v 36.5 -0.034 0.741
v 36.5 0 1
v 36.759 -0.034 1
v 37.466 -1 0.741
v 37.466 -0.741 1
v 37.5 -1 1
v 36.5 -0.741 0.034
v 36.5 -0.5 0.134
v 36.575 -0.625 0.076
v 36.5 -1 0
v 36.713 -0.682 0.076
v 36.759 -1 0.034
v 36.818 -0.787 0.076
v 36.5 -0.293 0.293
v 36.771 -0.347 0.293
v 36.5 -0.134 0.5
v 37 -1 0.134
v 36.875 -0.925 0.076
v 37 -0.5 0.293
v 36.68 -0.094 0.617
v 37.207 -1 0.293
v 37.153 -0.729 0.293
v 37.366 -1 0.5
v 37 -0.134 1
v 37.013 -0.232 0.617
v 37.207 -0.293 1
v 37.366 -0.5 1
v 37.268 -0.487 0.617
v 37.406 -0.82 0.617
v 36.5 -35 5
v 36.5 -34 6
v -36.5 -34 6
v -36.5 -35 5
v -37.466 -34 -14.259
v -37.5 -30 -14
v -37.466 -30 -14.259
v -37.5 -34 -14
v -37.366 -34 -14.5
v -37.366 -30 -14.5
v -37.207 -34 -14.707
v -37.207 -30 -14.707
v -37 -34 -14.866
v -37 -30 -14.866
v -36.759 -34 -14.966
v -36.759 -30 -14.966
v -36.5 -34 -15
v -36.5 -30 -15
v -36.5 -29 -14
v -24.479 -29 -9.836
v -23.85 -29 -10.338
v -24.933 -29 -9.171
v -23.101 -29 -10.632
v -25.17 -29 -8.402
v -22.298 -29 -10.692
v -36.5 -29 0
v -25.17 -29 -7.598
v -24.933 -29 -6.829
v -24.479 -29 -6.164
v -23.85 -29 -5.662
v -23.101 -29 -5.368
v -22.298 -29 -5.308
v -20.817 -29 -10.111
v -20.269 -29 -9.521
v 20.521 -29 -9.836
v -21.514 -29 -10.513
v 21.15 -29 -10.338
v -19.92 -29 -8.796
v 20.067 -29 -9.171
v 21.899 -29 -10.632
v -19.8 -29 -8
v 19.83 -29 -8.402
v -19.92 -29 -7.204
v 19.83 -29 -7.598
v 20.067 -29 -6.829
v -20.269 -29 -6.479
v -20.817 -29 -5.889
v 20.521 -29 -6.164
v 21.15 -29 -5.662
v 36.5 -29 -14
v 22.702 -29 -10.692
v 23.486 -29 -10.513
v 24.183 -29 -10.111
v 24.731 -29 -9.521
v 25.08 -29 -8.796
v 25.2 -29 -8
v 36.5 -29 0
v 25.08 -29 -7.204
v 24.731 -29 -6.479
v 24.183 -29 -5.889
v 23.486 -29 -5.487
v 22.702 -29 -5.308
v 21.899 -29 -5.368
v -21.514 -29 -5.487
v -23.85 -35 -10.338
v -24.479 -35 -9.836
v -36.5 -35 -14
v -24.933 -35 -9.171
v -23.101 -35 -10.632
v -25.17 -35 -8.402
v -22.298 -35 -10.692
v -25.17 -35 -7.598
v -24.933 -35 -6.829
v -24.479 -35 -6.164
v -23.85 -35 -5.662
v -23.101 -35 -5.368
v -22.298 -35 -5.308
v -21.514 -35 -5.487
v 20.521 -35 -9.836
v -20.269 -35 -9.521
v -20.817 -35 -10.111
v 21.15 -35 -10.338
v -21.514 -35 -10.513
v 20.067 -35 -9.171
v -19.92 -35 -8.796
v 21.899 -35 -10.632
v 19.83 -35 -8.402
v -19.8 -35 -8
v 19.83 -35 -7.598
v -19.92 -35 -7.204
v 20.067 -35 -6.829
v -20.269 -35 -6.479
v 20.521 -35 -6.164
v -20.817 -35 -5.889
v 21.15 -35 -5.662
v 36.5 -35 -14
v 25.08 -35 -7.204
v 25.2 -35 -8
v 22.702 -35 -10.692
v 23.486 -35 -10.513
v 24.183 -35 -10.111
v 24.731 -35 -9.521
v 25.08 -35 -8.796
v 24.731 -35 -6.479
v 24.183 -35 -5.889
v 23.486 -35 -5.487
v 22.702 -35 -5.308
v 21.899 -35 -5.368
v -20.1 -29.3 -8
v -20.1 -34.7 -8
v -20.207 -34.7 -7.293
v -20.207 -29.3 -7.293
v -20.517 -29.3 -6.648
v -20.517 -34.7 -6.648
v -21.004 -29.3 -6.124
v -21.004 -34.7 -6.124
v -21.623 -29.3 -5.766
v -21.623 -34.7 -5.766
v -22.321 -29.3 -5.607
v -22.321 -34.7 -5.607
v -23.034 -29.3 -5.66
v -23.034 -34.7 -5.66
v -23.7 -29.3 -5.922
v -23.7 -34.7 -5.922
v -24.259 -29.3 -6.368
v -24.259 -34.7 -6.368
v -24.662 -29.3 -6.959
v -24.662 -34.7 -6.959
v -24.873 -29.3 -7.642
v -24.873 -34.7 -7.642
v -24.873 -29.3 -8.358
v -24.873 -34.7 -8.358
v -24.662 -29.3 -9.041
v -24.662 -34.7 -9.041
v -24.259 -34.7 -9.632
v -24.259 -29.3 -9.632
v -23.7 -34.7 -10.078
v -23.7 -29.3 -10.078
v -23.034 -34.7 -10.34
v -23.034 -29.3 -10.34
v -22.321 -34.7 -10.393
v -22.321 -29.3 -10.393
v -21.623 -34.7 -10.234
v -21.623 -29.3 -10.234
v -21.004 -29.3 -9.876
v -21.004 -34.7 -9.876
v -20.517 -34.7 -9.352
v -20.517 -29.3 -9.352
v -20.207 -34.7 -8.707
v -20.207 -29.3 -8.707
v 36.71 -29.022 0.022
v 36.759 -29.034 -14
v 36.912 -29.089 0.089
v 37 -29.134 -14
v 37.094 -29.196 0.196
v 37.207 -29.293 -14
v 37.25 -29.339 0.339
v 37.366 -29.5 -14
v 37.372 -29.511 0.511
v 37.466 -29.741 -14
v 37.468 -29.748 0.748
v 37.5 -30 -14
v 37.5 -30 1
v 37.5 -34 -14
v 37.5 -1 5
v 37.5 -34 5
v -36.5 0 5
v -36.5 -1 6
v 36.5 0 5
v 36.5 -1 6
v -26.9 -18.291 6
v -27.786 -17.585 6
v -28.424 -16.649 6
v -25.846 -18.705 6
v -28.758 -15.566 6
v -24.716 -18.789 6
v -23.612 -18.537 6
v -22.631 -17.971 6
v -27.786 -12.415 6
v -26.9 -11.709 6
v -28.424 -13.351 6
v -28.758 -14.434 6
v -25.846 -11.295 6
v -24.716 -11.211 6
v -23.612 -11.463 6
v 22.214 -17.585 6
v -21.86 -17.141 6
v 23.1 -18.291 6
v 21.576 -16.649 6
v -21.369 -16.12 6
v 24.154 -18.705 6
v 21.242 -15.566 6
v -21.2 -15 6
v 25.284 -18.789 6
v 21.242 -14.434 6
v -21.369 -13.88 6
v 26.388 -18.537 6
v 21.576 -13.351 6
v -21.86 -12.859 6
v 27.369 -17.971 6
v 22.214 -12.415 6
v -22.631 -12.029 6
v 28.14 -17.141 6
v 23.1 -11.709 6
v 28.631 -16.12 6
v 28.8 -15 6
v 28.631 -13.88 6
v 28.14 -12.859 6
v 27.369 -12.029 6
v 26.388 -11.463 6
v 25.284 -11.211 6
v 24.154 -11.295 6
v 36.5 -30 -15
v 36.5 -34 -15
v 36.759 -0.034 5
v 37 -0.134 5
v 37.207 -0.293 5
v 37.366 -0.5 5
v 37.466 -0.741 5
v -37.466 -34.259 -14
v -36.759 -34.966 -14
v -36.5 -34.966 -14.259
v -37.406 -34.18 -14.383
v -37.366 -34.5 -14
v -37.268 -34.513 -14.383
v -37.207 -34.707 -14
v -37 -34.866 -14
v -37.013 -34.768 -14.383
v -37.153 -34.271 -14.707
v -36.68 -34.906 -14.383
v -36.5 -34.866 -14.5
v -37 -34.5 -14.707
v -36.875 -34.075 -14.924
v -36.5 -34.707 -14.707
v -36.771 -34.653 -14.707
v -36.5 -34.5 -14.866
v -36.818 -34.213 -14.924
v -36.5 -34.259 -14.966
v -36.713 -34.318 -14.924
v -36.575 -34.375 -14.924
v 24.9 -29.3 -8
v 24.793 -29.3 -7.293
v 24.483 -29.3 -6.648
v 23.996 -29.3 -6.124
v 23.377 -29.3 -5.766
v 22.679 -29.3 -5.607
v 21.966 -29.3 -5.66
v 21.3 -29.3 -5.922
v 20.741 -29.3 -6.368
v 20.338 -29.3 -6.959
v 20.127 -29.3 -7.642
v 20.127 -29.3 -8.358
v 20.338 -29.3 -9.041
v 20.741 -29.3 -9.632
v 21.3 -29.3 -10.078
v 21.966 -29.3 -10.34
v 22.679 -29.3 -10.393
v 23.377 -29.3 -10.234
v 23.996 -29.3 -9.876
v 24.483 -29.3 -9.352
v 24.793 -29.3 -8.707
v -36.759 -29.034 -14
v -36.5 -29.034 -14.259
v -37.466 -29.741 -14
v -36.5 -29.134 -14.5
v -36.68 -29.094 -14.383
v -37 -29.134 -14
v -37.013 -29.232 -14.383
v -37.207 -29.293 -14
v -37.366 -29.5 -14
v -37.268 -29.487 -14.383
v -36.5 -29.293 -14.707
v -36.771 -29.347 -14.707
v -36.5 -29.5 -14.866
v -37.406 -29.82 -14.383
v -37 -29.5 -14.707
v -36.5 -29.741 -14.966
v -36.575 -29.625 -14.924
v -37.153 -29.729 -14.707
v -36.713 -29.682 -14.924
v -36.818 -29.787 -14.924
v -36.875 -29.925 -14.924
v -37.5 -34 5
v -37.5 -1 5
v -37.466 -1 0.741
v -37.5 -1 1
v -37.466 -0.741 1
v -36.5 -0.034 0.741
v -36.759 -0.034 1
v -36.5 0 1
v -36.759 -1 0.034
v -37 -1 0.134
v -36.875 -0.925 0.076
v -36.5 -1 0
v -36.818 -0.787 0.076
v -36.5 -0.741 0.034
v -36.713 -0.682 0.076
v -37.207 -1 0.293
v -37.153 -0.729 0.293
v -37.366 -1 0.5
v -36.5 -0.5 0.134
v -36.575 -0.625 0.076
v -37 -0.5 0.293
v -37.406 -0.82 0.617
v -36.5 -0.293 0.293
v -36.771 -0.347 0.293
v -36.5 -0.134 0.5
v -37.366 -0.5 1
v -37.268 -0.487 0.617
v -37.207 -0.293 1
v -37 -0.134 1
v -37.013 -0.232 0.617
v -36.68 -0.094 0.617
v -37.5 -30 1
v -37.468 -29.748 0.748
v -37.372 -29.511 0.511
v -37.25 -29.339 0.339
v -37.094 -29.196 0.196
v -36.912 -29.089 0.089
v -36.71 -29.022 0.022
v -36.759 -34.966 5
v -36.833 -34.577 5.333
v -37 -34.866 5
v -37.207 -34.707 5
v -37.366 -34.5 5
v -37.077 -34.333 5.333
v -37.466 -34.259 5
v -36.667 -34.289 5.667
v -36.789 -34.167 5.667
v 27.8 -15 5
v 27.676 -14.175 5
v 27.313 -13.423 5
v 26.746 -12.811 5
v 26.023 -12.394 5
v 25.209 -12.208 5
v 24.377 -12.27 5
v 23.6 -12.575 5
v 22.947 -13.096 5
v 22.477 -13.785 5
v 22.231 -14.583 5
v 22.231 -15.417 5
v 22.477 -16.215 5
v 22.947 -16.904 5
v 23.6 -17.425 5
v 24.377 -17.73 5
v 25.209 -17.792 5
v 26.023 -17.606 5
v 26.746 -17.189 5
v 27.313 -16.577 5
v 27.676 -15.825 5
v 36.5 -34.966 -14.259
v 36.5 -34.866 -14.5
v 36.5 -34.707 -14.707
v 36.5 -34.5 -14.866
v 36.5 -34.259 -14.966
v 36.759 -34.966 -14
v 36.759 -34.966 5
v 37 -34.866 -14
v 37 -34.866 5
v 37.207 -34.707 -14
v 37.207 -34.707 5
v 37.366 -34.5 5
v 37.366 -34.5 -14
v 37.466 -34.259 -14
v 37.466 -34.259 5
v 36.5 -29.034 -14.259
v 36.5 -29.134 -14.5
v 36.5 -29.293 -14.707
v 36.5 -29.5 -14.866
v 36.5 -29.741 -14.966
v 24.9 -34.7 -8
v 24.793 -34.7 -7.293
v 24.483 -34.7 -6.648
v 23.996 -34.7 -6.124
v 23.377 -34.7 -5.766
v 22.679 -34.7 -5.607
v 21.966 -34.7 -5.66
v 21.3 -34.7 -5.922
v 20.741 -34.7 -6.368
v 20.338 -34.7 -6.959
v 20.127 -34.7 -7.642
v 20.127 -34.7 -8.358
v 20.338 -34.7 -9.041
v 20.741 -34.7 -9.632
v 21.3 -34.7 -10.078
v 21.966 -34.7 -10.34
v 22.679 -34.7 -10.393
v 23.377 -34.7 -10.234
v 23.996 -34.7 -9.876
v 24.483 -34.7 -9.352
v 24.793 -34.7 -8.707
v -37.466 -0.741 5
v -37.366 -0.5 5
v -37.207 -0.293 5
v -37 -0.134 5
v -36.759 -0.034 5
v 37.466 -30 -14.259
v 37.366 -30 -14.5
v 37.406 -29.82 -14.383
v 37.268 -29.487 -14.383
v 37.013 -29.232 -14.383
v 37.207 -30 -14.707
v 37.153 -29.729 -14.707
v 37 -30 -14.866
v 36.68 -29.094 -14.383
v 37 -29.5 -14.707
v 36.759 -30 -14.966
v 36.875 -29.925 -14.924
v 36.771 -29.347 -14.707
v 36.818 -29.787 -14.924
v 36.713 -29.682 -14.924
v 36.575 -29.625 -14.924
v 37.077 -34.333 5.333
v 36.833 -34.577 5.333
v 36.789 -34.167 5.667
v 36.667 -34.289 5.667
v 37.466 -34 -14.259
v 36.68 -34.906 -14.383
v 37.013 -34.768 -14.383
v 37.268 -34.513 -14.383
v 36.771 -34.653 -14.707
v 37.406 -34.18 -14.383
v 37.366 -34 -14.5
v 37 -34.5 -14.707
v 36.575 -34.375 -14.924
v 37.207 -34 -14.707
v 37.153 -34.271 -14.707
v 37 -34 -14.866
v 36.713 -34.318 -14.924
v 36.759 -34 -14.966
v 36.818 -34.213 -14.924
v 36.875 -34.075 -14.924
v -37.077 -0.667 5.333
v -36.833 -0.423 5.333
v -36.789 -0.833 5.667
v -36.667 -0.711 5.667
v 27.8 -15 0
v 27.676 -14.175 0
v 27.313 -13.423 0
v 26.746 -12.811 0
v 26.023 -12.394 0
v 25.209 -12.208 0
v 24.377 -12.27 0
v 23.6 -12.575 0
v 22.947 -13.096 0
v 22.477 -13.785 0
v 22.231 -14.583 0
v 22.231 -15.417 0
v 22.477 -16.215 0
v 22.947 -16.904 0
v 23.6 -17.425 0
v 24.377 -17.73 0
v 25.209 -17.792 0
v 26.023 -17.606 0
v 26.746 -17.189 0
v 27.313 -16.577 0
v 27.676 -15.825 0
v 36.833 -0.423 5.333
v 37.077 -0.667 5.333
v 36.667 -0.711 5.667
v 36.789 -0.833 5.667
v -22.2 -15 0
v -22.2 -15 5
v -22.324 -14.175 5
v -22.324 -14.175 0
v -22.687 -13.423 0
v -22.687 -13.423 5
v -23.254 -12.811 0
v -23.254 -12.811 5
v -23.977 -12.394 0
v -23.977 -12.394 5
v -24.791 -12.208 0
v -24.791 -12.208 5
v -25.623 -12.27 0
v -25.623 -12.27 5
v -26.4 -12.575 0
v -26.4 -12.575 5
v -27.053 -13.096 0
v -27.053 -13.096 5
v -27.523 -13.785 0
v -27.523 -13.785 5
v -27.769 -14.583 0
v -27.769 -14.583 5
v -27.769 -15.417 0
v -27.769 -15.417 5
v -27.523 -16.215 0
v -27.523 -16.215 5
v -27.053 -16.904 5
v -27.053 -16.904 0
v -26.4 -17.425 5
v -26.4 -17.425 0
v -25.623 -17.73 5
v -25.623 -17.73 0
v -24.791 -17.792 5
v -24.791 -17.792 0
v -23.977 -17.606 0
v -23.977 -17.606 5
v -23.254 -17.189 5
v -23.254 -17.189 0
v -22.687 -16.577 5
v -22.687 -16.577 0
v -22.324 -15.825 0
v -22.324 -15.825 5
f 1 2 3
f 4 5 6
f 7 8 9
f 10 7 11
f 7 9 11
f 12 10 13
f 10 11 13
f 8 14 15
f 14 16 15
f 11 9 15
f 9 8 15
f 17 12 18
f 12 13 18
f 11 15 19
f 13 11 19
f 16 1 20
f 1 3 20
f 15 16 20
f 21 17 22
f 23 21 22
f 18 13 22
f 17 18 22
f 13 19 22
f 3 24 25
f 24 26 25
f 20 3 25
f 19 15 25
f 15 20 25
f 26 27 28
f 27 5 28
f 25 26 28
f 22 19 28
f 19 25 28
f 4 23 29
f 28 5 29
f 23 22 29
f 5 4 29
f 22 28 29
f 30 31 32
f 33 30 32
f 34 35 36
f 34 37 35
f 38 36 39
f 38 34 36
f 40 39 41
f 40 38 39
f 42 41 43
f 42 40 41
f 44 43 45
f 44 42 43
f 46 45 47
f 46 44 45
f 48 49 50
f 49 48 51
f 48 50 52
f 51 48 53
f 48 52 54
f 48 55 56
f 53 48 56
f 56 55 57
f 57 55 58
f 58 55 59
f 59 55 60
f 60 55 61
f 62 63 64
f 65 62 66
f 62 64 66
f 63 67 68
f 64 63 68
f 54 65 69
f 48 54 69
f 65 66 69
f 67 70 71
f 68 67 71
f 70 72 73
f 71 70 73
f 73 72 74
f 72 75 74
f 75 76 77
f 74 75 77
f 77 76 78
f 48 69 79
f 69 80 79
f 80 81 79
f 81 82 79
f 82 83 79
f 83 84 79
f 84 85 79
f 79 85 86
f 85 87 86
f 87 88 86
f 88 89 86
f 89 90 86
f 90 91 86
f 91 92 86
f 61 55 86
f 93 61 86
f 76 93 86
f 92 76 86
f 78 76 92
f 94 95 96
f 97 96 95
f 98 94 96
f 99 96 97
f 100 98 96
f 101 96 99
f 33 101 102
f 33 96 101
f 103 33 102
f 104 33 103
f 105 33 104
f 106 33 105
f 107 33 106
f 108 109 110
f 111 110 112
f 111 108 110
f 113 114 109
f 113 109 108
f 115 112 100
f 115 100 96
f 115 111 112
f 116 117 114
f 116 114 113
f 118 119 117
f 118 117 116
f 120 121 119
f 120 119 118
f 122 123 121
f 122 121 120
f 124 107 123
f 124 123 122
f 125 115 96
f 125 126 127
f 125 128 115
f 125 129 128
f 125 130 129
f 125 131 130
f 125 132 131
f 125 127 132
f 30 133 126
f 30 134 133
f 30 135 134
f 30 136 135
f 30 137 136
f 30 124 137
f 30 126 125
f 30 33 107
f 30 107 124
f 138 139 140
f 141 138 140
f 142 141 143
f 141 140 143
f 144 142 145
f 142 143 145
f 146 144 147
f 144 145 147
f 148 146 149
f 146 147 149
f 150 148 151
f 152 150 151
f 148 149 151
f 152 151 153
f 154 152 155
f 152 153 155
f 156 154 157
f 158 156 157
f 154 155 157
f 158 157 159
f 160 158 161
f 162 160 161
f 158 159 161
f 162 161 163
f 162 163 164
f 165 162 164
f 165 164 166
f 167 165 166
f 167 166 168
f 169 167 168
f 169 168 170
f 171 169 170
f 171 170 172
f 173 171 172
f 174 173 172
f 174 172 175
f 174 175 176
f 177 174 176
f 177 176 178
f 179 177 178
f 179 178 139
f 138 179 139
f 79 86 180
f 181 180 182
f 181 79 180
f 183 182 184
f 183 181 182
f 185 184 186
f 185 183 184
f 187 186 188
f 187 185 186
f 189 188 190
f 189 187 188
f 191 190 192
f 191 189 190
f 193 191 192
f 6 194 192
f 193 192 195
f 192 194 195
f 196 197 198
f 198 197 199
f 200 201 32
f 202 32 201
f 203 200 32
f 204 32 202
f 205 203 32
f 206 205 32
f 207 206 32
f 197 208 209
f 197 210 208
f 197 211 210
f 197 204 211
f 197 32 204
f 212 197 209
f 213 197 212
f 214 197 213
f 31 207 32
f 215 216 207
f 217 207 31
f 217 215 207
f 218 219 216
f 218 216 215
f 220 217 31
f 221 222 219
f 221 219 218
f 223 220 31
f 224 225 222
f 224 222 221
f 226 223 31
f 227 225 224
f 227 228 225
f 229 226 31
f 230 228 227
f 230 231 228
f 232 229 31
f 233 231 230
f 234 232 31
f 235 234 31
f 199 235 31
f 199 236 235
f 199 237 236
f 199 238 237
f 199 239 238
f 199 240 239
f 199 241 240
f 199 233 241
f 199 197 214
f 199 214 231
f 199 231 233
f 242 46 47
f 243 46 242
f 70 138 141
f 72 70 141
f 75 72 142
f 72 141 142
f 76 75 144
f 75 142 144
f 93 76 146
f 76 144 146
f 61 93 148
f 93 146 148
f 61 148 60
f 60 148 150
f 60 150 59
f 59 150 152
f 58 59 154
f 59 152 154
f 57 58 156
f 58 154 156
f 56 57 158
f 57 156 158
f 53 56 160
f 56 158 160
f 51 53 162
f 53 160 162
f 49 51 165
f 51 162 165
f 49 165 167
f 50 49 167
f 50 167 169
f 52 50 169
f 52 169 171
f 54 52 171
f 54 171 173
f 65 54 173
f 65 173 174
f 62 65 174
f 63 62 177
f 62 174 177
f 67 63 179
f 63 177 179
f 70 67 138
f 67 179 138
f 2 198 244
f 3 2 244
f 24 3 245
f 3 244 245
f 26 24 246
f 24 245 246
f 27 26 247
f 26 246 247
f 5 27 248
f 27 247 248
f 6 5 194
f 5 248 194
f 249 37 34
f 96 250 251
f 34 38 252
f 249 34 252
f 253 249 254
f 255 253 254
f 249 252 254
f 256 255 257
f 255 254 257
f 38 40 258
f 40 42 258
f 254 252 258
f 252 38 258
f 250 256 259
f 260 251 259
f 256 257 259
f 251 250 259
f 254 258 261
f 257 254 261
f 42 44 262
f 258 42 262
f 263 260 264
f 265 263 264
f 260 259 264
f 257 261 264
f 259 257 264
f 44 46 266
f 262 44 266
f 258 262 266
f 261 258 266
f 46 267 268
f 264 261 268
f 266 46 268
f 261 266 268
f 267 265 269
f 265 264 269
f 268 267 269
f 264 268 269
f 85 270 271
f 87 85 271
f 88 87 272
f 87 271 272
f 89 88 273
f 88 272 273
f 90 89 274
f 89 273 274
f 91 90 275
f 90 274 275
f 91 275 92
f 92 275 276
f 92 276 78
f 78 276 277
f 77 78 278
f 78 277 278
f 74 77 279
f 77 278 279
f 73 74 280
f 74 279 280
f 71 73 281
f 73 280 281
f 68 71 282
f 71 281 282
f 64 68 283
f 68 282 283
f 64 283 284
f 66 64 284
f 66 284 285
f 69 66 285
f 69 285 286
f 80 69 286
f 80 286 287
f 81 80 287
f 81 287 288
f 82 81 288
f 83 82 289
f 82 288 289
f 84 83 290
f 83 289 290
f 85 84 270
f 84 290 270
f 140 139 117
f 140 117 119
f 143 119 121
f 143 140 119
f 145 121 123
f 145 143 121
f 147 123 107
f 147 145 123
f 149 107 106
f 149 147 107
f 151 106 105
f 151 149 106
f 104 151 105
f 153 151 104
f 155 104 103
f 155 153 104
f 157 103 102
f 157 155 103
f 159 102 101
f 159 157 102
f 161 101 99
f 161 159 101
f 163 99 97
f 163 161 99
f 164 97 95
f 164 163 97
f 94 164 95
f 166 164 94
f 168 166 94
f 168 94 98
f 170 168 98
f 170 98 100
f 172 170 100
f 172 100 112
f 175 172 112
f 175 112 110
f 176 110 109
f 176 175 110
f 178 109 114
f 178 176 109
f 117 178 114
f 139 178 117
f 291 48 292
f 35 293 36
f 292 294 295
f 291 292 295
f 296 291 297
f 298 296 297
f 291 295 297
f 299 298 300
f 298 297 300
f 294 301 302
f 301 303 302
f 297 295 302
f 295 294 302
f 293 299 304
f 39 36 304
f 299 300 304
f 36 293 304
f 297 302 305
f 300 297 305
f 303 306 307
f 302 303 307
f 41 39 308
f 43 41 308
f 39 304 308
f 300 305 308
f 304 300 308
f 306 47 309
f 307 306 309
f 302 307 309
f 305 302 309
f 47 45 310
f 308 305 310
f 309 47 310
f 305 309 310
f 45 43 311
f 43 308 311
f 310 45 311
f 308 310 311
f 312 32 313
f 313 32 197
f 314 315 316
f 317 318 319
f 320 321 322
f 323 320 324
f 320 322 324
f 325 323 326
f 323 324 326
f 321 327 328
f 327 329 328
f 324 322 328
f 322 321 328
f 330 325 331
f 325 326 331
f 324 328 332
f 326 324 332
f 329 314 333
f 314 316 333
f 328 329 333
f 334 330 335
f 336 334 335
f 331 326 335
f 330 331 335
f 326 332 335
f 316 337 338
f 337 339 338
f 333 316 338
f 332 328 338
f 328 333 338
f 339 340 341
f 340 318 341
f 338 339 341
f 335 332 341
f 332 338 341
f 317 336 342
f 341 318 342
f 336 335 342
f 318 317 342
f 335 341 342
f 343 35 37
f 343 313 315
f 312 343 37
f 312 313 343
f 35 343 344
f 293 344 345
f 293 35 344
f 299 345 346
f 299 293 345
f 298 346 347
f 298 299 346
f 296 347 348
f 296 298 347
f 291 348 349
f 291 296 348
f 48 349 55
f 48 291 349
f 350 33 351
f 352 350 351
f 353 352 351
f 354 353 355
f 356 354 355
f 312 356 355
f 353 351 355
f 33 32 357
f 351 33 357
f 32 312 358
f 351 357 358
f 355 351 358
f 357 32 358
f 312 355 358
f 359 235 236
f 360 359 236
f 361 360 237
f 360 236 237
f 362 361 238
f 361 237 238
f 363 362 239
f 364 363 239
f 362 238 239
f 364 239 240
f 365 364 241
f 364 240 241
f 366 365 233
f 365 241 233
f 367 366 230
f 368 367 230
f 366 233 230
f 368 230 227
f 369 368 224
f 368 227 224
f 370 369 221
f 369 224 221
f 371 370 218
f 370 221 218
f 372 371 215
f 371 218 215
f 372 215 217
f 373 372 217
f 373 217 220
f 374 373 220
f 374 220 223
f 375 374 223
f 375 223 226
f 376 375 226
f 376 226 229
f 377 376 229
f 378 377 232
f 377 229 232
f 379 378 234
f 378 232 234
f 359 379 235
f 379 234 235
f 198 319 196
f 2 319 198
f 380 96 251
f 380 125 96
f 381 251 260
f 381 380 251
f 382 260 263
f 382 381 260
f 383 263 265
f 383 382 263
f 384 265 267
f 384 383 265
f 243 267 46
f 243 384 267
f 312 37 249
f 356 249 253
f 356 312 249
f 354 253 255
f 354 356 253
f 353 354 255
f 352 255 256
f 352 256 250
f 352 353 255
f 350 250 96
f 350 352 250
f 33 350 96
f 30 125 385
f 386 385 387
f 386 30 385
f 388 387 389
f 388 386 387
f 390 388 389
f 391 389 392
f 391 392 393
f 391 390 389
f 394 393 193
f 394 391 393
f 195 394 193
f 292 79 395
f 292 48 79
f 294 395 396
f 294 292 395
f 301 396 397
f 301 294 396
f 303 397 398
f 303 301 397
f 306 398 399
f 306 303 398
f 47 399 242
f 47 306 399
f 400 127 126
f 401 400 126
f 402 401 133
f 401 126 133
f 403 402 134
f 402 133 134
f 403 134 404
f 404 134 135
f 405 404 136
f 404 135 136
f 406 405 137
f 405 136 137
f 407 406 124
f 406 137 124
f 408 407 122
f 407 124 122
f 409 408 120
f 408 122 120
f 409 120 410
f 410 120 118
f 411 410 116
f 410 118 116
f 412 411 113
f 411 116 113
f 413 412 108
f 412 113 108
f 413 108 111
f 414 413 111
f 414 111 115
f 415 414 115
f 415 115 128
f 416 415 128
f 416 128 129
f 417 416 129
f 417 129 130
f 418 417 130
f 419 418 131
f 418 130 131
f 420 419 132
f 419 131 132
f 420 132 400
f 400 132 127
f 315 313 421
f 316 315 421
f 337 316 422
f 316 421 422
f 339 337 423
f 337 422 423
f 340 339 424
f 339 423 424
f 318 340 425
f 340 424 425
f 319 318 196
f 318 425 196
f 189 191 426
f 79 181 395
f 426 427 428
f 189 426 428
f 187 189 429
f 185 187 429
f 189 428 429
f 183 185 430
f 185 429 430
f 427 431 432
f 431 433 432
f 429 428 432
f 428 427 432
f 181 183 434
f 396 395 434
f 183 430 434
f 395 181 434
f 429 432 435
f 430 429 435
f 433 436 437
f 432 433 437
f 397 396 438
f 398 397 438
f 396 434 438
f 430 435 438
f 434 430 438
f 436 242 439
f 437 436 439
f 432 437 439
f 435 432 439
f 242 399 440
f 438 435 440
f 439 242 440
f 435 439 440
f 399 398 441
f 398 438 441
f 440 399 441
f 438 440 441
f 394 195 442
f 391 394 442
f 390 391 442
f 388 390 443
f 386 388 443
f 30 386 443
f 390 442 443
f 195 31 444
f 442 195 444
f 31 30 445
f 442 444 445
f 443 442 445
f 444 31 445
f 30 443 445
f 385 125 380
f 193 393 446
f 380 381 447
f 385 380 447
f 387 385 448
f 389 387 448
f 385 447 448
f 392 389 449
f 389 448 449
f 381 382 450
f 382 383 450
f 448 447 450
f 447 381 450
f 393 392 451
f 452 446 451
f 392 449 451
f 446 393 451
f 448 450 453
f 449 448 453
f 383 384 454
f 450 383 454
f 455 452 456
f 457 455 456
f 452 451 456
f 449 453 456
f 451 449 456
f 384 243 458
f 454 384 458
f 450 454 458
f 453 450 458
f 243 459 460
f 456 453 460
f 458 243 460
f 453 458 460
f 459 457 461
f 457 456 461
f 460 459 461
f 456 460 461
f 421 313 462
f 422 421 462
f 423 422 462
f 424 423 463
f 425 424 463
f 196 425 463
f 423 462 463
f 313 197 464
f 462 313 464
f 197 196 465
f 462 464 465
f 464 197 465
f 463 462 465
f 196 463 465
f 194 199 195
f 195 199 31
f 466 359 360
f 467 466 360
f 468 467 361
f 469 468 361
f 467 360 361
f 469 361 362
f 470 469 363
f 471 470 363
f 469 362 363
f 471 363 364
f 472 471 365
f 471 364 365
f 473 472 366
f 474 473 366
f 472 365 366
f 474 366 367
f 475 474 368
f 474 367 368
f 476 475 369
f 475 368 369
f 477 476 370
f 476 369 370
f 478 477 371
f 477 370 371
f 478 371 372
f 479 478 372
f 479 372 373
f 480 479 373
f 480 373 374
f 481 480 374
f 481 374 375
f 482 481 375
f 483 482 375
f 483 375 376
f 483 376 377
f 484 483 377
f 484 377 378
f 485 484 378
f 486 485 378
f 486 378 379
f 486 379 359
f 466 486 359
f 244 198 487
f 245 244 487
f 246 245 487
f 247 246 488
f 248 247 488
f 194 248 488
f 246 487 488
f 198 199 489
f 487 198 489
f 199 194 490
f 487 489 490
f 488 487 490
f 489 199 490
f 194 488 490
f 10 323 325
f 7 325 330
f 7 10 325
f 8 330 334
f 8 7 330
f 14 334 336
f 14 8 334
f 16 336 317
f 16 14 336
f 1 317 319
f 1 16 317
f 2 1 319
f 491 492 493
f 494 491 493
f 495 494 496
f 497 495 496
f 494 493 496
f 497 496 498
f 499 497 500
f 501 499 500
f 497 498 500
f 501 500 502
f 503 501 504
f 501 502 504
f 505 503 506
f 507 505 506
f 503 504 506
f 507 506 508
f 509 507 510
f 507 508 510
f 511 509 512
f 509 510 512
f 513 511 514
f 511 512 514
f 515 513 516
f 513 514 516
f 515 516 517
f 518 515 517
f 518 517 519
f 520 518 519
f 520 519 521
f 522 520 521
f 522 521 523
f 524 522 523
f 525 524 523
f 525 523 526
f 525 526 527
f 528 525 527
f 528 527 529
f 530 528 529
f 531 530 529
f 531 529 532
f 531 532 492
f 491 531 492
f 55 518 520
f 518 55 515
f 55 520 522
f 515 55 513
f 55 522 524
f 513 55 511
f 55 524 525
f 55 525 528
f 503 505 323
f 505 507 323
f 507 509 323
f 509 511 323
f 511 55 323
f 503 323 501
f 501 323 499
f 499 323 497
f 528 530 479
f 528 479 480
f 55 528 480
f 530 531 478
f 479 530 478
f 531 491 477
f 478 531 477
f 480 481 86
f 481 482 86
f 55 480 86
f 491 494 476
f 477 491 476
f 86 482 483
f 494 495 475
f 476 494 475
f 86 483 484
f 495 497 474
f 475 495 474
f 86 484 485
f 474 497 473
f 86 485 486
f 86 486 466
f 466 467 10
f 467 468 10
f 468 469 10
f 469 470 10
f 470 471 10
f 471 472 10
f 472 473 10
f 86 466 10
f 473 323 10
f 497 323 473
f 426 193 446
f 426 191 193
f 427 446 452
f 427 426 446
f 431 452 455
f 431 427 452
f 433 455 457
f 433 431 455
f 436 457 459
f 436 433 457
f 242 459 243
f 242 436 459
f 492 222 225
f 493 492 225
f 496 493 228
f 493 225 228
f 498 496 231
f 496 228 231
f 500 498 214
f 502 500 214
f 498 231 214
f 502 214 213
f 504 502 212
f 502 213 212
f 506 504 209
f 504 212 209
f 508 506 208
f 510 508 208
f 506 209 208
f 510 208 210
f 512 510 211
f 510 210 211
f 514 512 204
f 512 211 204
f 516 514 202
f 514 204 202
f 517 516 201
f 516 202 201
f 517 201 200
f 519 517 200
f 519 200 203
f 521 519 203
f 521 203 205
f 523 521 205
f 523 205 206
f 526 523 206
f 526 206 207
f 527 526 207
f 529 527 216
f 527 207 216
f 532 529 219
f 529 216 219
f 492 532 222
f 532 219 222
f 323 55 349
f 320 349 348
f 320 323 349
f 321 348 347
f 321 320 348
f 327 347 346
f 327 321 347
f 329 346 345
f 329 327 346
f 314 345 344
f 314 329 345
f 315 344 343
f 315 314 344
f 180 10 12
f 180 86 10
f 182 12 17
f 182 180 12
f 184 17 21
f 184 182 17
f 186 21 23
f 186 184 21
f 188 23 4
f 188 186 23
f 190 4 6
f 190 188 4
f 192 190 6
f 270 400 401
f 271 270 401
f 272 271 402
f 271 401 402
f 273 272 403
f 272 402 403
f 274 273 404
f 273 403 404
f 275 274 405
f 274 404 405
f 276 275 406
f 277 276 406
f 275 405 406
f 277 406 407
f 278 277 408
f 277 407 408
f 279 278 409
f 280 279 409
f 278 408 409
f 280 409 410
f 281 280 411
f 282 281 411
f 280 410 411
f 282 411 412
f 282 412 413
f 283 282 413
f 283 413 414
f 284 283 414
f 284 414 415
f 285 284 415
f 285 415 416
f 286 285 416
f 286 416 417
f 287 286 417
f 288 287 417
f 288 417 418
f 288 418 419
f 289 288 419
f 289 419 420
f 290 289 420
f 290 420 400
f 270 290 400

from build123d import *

# Parameters (mm, degrees)
SKETCH_W        = 75
SKETCH_H        = 35
PAD_DEPTH       = 6
SKETCH001_W     = 75
SKETCH001_H     = 6
PAD001_DEPTH    = 15
SKETCH002_R     = 2.8
POCKET_DEPTH    = 21.001
SKETCH003_R     = 2.4
POCKET001_DEPTH = 35.001
FILLET_R        = 1
CHAMFER_SIZE    = 0.3
CHAMFER001_SIZE = 1
FILLET001_R     = 1
FILLET002_R     = 1


with BuildPart() as part:
    # Sketch → Pad (new body)
    with BuildSketch(Plane.XY):
        with Locations((0, -17.5)):
            Rectangle(SKETCH_W, SKETCH_H)
    extrude(amount=PAD_DEPTH)

    # Sketch001 (on Face5 of Pad) → Pad001 (join)
    with BuildSketch(Plane(origin=(0, 0, 0), x_dir=(1, 0, 0), z_dir=(0, 0, -1))):
        with Locations((0, 32)):
            Rectangle(SKETCH001_W, SKETCH001_H)
    extrude(amount=PAD001_DEPTH)

    # Sketch002 (on Face6 of Pad001) → Pocket (cut, through all)
    with BuildSketch(Plane.XY.offset(6)):
        with Locations((-25, -15)):
            Circle(SKETCH002_R)
        with Locations((25, -15)):
            Circle(SKETCH002_R)
    extrude(amount=-POCKET_DEPTH, mode=Mode.SUBTRACT)

    # Sketch003 (on Face8 of Pocket) → Pocket001 (cut, through all)
    with BuildSketch(Plane.XZ.offset(35)):
        with Locations((-22.5, -8)):
            Circle(SKETCH003_R)
        with Locations((22.5, -8)):
            Circle(SKETCH003_R)
    extrude(amount=-POCKET001_DEPTH, mode=Mode.SUBTRACT)

    # Fillet
    fillet_edges = [part.edges().sort_by_distance(p)[0] for p in [
        (-37.5, 0, 3),
        (-37.5, -35, -7.5),
        (37.5, -35, -7.5),
        (37.5, 0, 3),
        (37.5, -29, -7.5),
        (-37.5, -29, -7.5),
    ]]
    fillet(fillet_edges, radius=FILLET_R)

    # Chamfer
    chamfer_edges = [part.edges().sort_by_distance(p)[0] for p in [
        (-24.9, -29, -8),
        (20.1, -29, -8),
        (20.1, -35, -8),
        (-24.9, -35, -8),
    ]]
    chamfer(chamfer_edges, length=CHAMFER_SIZE)

    # Chamfer001
    chamfer001_edges = [part.edges().sort_by_distance(p)[0] for p in [
        (-37.5, -17.5, 6),
        (-37.207107, -34.707107, 6),
        (0, -35, 6),
        (37.207107, -34.707107, 6),
        (37.5, -17.5, 6),
        (37.207107, -0.292893, 6),
        (0, 0, 6),
        (-37.207107, -0.292893, 6),
        (-27.8, -15, 6),
        (22.2, -15, 6),
    ]]
    chamfer(chamfer001_edges, length=CHAMFER001_SIZE)

    # Fillet001
    fillet001_edges = [part.edges().sort_by_distance(p)[0] for p in [
        (0, 0, 0),
    ]]
    fillet(fillet001_edges, radius=FILLET001_R)

    # Fillet002
    fillet002_edges = [part.edges().sort_by_distance(p)[0] for p in [
        (-37.5, -32, -15),
        (-37.207107, -29.292893, -15),
        (0, -29, -15),
        (37.207107, -29.292893, -15),
        (37.5, -32, -15),
        (37.207107, -34.707107, -15),
        (0, -35, -15),
        (-37.207107, -34.707107, -15),
    ]]
    fillet(fillet002_edges, radius=FILLET002_R)


solid = part.part
